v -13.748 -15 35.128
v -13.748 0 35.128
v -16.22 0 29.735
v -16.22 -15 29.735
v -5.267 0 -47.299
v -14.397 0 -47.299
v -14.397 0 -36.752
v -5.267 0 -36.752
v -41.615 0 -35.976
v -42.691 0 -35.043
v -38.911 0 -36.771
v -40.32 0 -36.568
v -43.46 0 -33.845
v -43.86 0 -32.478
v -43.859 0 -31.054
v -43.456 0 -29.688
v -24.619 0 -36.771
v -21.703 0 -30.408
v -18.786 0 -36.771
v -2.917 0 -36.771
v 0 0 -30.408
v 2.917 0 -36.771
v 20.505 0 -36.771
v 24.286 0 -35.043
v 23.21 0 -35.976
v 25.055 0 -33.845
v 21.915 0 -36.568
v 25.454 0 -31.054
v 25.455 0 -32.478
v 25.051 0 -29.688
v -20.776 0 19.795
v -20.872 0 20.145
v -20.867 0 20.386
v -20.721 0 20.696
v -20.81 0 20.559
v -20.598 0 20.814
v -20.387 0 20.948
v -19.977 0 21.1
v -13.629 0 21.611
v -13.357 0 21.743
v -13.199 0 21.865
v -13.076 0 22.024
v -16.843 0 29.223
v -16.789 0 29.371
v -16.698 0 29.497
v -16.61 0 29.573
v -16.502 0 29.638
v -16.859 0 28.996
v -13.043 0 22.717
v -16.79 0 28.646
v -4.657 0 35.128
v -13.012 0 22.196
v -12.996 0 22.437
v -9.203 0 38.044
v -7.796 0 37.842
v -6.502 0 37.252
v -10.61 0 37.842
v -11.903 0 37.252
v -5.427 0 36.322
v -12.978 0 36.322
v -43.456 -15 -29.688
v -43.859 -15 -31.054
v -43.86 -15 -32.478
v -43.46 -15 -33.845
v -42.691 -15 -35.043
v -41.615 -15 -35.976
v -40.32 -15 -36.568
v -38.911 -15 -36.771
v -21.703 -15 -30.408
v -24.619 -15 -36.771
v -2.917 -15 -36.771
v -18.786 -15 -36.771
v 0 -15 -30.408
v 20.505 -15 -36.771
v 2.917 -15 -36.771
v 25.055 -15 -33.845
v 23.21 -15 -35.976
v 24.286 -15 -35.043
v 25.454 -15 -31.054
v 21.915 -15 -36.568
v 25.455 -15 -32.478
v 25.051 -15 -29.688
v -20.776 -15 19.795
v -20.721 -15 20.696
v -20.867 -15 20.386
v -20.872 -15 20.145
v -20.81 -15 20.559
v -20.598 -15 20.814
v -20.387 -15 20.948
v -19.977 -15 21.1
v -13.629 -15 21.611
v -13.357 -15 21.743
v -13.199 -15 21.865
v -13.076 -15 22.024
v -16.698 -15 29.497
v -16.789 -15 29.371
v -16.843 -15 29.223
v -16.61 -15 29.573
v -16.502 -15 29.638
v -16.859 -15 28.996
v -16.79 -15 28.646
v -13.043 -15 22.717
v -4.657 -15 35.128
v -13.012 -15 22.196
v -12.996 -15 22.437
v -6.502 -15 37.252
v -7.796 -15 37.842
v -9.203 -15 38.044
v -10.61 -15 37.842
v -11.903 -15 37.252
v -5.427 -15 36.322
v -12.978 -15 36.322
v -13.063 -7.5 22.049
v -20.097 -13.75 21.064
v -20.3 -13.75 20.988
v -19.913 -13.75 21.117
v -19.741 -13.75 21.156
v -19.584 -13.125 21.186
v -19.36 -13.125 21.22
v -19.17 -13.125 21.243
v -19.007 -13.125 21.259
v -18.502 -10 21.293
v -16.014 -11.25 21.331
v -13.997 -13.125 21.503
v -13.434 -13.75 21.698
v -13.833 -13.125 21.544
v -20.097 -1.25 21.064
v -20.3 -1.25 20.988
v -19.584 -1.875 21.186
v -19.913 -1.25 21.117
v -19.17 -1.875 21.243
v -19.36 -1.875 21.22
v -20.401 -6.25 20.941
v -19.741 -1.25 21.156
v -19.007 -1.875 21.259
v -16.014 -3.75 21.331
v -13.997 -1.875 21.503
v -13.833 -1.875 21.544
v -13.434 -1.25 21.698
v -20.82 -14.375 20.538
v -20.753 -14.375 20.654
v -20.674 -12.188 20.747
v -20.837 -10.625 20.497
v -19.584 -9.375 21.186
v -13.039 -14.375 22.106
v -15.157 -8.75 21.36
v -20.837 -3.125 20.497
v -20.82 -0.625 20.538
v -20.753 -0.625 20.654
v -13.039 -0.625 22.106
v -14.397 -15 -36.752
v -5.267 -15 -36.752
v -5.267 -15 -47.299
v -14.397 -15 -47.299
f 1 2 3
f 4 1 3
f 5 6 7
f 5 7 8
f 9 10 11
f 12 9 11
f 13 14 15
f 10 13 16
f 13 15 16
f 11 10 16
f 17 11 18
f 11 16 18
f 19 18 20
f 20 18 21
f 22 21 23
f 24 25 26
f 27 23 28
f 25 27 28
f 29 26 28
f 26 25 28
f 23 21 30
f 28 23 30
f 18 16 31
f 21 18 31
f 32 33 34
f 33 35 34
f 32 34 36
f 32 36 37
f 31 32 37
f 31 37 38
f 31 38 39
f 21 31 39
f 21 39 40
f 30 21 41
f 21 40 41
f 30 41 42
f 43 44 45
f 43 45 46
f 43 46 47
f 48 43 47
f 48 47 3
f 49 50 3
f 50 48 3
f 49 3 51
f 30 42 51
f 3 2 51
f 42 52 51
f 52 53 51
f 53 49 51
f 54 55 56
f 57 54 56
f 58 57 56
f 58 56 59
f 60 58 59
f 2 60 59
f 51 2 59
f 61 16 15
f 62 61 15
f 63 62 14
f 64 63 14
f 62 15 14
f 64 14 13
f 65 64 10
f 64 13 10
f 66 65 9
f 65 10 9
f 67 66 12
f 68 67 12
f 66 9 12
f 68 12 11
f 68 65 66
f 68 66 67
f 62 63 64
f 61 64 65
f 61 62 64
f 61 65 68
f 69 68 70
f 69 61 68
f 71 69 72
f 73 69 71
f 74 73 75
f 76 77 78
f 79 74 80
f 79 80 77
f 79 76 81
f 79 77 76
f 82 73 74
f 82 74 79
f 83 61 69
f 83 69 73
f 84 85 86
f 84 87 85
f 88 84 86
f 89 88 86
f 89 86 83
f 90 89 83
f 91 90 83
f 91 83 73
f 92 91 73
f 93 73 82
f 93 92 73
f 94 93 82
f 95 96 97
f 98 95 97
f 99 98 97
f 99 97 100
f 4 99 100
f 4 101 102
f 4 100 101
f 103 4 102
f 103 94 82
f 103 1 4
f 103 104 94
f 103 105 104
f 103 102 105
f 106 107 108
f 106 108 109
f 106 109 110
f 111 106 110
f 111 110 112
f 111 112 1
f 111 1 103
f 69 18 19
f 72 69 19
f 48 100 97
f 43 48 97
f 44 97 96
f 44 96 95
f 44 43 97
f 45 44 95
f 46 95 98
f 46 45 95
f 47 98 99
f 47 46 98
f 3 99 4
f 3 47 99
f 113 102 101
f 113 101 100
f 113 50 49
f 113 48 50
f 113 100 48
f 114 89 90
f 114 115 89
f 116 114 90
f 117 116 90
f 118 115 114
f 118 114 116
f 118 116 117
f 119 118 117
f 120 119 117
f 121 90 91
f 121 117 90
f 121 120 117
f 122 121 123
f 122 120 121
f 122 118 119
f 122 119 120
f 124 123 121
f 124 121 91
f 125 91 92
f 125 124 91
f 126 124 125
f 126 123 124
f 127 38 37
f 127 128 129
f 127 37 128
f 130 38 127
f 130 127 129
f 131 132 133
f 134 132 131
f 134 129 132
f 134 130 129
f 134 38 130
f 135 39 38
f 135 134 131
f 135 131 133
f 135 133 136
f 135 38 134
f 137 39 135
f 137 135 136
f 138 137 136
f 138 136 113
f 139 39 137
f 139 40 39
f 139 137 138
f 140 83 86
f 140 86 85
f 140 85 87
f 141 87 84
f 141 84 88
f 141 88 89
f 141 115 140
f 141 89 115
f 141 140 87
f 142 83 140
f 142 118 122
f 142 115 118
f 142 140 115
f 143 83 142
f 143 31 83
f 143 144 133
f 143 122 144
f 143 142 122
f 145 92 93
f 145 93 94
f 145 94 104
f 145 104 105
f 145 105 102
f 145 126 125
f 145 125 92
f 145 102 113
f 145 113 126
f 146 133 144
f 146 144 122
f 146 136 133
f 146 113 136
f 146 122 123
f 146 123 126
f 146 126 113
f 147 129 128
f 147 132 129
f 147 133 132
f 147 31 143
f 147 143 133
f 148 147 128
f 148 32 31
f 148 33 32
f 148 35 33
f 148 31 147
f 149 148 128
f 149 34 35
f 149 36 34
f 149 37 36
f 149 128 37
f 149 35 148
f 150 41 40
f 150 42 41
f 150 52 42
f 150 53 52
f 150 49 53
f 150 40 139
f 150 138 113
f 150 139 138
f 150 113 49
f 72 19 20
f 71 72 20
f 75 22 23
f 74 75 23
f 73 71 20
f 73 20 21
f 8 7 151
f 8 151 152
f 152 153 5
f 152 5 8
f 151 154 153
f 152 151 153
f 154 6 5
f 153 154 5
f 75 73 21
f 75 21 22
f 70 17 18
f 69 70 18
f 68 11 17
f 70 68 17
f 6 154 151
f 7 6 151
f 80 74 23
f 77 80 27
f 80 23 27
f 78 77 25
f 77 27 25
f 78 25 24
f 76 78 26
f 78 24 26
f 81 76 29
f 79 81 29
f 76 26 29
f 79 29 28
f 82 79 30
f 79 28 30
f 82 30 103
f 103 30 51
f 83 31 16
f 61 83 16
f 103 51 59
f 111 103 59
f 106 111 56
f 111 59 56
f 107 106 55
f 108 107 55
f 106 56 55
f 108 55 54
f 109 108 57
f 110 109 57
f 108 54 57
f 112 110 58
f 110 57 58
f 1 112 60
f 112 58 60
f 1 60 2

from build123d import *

# Parameters (mm, degrees)
F2_DEPTH = 15
F0_W     = 9.1302250512
F0_H     = 10.5469860137
F3_DEPTH = 15


with BuildPart() as f2:
    # F1 (on Front) → F2 (new body)
    with BuildSketch(Plane.XZ):
        with BuildLine():
            ThreePointArc((-43.4559331368, -29.6877108018), (-43.11876348, -34.4713527594), (-38.9106364224, -36.7710441351))
            Line((-38.9106364224, -36.7710441351), (-24.6192403138, -36.7710441351))
            Line((-24.6192403138, -36.7710441351), (-21.7025736471, -30.4076287349))
            Line((-21.7025736471, -30.4076287349), (-18.7859069804, -36.7710441351))
            Line((-18.7859069804, -36.7710441351), (-13.9942403138, -36.7710441351))
            Line((-13.9942403138, -36.7710441351), (-9.2025736471, -36.7710441351))
            Line((-9.2025736471, -36.7710441351), (-6.2116375193, -36.7710441351))
            Line((-6.2116375193, -36.7710441351), (-2.917, -36.7710441351))
            Line((-2.917, -36.7710441351), (0, -30.4076287349))
            Line((0, -30.4076287349), (2.917, -36.7710441351))
            Line((2.917, -36.7710441351), (20.5054891282, -36.7710441351))
            ThreePointArc((20.5054891282, -36.7710441351), (24.7136161858, -34.4713527594), (25.0507858426, -29.6877108018))
            Line((25.0507858426, -29.6877108018), (-4.6572769327, 35.127630058))
            ThreePointArc((-4.6572769327, 35.127630058), (-9.2025736471, 38.0442967247), (-13.7478703615, 35.127630058))
            Line((-13.7478703615, 35.127630058), (-16.2195350364, 29.7350943815))
            add(Edge.make_bspline(
                [(-20.7757465894, 19.7946143485), (-21.8724480942, 22.4717409157), (-5.7133538913, 18.3496784962), (-18.9018251697, 29.1361064938), (-16.2195350364, 29.7350943815)],
                knots=[0, 0, 0, 0, 0.49581728, 1, 1, 1, 1], degree=3))
            Line((-20.7757465894, 19.7946143485), (-43.4559331368, -29.6877108018))
        make_face()
    extrude(amount=F2_DEPTH)


with BuildPart() as f3:
    # F0 (on Front) → F3 (new body)
    with BuildSketch(Plane.XZ):
        with Locations((-9.8322441336, -42.0257952064)):
            Rectangle(F0_W, F0_H)
    extrude(amount=F3_DEPTH)


solid = Compound([f2.part, f3.part])
